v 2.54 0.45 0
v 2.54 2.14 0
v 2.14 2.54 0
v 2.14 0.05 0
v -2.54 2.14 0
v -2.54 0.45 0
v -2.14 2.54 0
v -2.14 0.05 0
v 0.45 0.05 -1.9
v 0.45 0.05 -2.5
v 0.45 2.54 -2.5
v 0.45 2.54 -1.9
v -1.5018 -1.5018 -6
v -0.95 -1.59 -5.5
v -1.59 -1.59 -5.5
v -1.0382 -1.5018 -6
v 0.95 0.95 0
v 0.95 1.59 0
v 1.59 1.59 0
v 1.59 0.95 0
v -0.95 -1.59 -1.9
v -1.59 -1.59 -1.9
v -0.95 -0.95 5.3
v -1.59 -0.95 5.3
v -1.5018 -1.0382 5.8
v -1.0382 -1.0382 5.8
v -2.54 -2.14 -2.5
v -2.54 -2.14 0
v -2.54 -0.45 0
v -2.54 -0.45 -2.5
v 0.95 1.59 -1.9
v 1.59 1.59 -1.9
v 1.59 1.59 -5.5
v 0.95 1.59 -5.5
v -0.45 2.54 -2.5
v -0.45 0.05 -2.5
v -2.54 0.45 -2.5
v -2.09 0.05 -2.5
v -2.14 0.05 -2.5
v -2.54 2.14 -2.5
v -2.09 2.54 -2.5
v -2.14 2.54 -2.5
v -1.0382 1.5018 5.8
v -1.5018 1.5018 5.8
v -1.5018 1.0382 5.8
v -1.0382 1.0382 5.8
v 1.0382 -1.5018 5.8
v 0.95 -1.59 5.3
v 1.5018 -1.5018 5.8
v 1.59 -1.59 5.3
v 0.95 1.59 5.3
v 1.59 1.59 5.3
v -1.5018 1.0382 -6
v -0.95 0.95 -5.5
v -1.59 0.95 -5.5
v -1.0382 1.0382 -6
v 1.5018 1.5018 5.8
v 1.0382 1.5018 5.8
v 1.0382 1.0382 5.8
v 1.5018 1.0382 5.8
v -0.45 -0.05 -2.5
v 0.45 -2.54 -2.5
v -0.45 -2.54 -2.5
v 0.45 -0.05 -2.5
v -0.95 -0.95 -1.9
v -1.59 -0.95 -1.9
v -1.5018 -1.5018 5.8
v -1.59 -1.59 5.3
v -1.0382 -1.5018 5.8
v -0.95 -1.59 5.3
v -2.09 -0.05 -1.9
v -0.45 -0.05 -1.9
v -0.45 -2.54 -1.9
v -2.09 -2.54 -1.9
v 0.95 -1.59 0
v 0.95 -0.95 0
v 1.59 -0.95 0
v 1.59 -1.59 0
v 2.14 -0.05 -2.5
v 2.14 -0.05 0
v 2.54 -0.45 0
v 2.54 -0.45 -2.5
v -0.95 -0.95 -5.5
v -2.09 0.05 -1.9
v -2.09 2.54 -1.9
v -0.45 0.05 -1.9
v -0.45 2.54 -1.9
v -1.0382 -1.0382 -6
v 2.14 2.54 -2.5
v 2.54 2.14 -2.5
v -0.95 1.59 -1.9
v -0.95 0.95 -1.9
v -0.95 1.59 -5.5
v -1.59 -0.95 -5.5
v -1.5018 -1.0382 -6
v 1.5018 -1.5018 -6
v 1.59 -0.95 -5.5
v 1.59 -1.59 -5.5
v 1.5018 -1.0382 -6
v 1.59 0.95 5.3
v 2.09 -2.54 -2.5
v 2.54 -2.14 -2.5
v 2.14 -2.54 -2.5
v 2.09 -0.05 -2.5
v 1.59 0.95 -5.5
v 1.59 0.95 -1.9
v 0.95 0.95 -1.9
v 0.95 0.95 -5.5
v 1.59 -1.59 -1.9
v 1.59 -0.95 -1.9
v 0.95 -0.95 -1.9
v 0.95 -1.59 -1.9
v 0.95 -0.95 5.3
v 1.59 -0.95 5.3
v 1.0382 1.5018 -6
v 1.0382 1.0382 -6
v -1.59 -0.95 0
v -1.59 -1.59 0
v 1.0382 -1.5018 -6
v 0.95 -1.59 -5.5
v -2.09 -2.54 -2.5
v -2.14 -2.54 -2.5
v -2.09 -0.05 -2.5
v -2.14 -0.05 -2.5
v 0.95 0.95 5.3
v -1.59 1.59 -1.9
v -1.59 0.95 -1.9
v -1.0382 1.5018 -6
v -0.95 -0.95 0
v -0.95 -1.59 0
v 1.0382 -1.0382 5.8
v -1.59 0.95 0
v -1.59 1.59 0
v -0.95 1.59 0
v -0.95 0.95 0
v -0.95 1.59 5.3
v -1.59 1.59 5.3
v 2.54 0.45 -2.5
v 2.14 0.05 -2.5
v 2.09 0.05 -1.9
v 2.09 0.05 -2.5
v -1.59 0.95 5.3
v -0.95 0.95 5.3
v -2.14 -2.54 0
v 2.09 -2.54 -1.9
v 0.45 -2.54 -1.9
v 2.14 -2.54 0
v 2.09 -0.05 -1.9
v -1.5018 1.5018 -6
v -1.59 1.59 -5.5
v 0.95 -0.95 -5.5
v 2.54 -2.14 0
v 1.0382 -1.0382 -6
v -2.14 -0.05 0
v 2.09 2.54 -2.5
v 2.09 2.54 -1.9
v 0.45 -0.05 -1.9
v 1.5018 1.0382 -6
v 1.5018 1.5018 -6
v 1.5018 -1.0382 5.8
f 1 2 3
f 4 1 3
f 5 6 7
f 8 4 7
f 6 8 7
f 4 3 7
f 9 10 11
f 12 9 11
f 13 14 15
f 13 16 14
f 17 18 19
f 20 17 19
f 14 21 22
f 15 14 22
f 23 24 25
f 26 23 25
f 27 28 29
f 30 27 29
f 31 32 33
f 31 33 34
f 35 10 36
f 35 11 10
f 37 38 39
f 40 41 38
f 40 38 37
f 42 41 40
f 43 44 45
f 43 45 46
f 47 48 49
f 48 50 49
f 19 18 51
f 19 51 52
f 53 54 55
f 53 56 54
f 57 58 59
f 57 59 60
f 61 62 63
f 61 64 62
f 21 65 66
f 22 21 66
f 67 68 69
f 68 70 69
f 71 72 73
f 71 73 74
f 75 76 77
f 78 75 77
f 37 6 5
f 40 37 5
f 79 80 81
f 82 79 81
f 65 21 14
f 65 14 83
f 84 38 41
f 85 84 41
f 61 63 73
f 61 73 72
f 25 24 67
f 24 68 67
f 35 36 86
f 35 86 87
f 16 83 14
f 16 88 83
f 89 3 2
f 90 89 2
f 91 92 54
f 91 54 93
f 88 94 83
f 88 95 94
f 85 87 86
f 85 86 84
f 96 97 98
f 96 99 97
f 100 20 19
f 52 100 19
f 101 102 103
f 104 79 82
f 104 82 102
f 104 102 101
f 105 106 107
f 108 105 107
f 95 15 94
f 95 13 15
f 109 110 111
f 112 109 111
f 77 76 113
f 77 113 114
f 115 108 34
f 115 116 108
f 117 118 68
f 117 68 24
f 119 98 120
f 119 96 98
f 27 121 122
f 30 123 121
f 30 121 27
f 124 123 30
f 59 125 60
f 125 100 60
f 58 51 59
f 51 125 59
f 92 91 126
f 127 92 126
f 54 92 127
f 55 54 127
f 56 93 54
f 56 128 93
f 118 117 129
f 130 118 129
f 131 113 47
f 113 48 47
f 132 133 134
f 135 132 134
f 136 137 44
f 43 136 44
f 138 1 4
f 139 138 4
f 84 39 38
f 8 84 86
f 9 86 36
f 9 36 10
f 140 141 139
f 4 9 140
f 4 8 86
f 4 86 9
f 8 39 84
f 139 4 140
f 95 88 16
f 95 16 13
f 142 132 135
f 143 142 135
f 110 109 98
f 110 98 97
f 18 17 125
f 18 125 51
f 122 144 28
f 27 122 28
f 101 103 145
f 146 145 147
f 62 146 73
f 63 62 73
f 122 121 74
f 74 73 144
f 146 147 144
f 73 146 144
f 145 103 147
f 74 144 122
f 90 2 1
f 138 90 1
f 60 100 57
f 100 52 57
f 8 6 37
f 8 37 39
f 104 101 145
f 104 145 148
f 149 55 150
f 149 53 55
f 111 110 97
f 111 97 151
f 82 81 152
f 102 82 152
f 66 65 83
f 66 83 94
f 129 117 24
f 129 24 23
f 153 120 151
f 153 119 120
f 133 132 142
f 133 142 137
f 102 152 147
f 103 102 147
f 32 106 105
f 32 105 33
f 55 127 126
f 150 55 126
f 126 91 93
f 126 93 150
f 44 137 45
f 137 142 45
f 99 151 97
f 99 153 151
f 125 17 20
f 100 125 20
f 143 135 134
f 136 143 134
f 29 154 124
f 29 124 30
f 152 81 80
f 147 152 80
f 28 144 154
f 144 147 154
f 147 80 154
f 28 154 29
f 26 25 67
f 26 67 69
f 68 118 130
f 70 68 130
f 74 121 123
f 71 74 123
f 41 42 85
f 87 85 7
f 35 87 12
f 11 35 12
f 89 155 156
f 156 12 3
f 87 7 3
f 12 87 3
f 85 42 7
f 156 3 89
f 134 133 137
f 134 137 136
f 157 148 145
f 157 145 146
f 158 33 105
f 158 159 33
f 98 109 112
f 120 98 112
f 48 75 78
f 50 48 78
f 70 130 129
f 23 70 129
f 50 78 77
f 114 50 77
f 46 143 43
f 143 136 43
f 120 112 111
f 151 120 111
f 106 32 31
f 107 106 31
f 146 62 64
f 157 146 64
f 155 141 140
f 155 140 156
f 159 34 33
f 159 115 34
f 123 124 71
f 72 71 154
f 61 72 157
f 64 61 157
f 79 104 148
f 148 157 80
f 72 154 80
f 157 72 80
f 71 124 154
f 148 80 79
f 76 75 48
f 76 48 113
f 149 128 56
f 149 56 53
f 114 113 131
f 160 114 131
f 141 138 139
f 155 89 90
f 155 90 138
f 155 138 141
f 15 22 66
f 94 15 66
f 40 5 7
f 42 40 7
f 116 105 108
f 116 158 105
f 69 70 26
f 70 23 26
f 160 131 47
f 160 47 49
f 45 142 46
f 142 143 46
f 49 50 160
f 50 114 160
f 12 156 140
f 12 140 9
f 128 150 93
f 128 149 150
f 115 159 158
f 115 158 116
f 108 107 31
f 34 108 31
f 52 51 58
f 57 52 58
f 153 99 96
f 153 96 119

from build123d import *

# Parameters (mm, degrees)
SKETCH1_W             = 0.64
SKETCH1_H             = 0.64
BOSS_EXTRUDE1_DEPTH   = 5.3
BOSS_EXTRUDE1_2_DEPTH = 5.3
BOSS_EXTRUDE1_3_DEPTH = 5.3
BOSS_EXTRUDE1_4_DEPTH = 5.3
SKETCH2_W             = 0.64
SKETCH2_H             = 0.64
BOSS_EXTRUDE2_DEPTH   = 0.5
BOSS_EXTRUDE2_TAPER   = 10
BOSS_EXTRUDE3_DEPTH   = 2.5
SKETCH5_W             = 1.64
SKETCH5_H             = 5.08
CUT_EXTRUDE1_DEPTH    = 0.6
SKETCH6_W             = 5.08
SKETCH6_H             = 0.1
CUT_EXTRUDE2_DEPTH    = 3.5
CUT_EXTRUDE3_DEPTH    = 3.5
SKETCH8_W             = 0.64
SKETCH8_H             = 0.64
BOSS_EXTRUDE4_DEPTH   = 3.6
BOSS_EXTRUDE4_2_DEPTH = 3.6
BOSS_EXTRUDE4_3_DEPTH = 3.6
BOSS_EXTRUDE4_4_DEPTH = 3.6
SKETCH9_W             = 0.64
SKETCH9_H             = 0.64
BOSS_EXTRUDE5_DEPTH   = 0.5
BOSS_EXTRUDE5_TAPER   = 10


with BuildPart() as part:
    # Sketch1 → Boss-Extrude1 (new body)
    with BuildSketch(Plane.XY):
        with Locations((-1.27, 1.27)):
            Rectangle(SKETCH1_W, SKETCH1_H)
    extrude(amount=BOSS_EXTRUDE1_DEPTH)



with BuildPart() as body_2:
    # Sketch1 → Boss-Extrude1 2 (new body)
    with BuildSketch(Plane.XY):
        with Locations((-1.27, -1.27)):
            Rectangle(SKETCH1_W, SKETCH1_H)
    extrude(amount=BOSS_EXTRUDE1_2_DEPTH)


with BuildPart() as body_3:
    # Sketch1 → Boss-Extrude1 3 (new body)
    with BuildSketch(Plane.XY):
        with Locations((1.27, 1.27)):
            Rectangle(SKETCH1_W, SKETCH1_H)
    extrude(amount=BOSS_EXTRUDE1_3_DEPTH)


with BuildPart() as body_4:
    # Sketch1 → Boss-Extrude1 4 (new body)
    with BuildSketch(Plane.XY):
        with Locations((1.27, -1.27)):
            Rectangle(SKETCH1_W, SKETCH1_H)
    extrude(amount=BOSS_EXTRUDE1_4_DEPTH)


with BuildPart() as part_1:
    add(part.part)

    add(body_2.part)  # Boss-Extrude2 merges body 2

    add(body_3.part)  # Boss-Extrude2 merges body 3

    add(body_4.part)  # Boss-Extrude2 merges body 4
    # Sketch2 → Boss-Extrude2 (add)
    with BuildSketch(Plane.XY.offset(5.3)):
        with Locations((-1.27, -1.27)):
            Rectangle(SKETCH2_W, SKETCH2_H)
        with Locations((-1.27, 1.27)):
            Rectangle(SKETCH2_W, SKETCH2_H)
        with Locations((1.27, -1.27)):
            Rectangle(SKETCH2_W, SKETCH2_H)
        with Locations((1.27, 1.27)):
            Rectangle(SKETCH2_W, SKETCH2_H)
    extrude(amount=BOSS_EXTRUDE2_DEPTH, taper=BOSS_EXTRUDE2_TAPER)


with BuildPart() as body_2_2:
    # Sketch3 → Boss-Extrude3 (new body)
    with BuildSketch(Plane.XY):
        Polygon((-2.14, 2.54), (2.14, 2.54), (2.54, 2.14), (2.54, -2.14), (2.14, -2.54), (-2.14, -2.54), (-2.54, -2.14), (-2.54, 2.14), align=None)
    extrude(amount=-BOSS_EXTRUDE3_DEPTH)

    # Sketch5 → Cut-Extrude1 (cut)
    with BuildSketch(Plane(origin=(0, 0, -2.5), x_dir=(-1, 0, 0), z_dir=(0, 0, -1))):
        with Locations((-1.27, 0)):
            Rectangle(SKETCH5_W, SKETCH5_H)
        with Locations((1.27, 0)):
            Rectangle(SKETCH5_W, SKETCH5_H)
    extrude(amount=-CUT_EXTRUDE1_DEPTH, mode=Mode.SUBTRACT)

    # Sketch6 → Cut-Extrude2 (cut, through all)
    with BuildSketch(Plane.XY):
        Rectangle(SKETCH6_W, SKETCH6_H)
    extrude(amount=-CUT_EXTRUDE2_DEPTH, mode=Mode.SUBTRACT)

    # Sketch7 → Cut-Extrude3 (cut, through all)
    with BuildSketch(Plane.XY):
        Polygon((2.54, 0.45), (2.14, 0.05), (2.54, 0.05), align=None)
        Polygon((2.54, -0.05), (2.14, -0.05), (2.54, -0.45), align=None)
        Polygon((-2.54, -0.45), (-2.54, -0.05), (-2.14, -0.05), align=None)
        Polygon((-2.54, 0.05), (-2.54, 0.45), (-2.14, 0.05), align=None)
    extrude(amount=-CUT_EXTRUDE3_DEPTH, mode=Mode.SUBTRACT)


with BuildPart() as body_3_2:
    # Sketch8 → Boss-Extrude4 (new body)
    with BuildSketch(Plane(origin=(0, 0, -1.9), x_dir=(-1, 0, 0), z_dir=(0, 0, -1))):
        with Locations((1.27, -1.27)):
            Rectangle(SKETCH8_W, SKETCH8_H)
    extrude(amount=BOSS_EXTRUDE4_DEPTH)



with BuildPart() as body_4_2:
    # Sketch8 → Boss-Extrude4 2 (new body)
    with BuildSketch(Plane(origin=(0, 0, -1.9), x_dir=(-1, 0, 0), z_dir=(0, 0, -1))):
        with Locations((1.27, 1.27)):
            Rectangle(SKETCH8_W, SKETCH8_H)
    extrude(amount=BOSS_EXTRUDE4_2_DEPTH)


with BuildPart() as body_5:
    # Sketch8 → Boss-Extrude4 3 (new body)
    with BuildSketch(Plane(origin=(0, 0, -1.9), x_dir=(-1, 0, 0), z_dir=(0, 0, -1))):
        with Locations((-1.27, 1.27)):
            Rectangle(SKETCH8_W, SKETCH8_H)
    extrude(amount=BOSS_EXTRUDE4_3_DEPTH)


with BuildPart() as body_6:
    # Sketch8 → Boss-Extrude4 4 (new body)
    with BuildSketch(Plane(origin=(0, 0, -1.9), x_dir=(-1, 0, 0), z_dir=(0, 0, -1))):
        with Locations((-1.27, -1.27)):
            Rectangle(SKETCH8_W, SKETCH8_H)
    extrude(amount=BOSS_EXTRUDE4_4_DEPTH)


with BuildPart() as body_3_2_1:
    add(body_3_2.part)

    add(body_4_2.part)  # Boss-Extrude5 merges body 4 2

    add(body_5.part)  # Boss-Extrude5 merges body 5

    add(body_6.part)  # Boss-Extrude5 merges body 6
    # Sketch9 → Boss-Extrude5 (add)
    with BuildSketch(Plane(origin=(0, 0, -5.5), x_dir=(-1, 0, 0), z_dir=(0, 0, -1))):
        with Locations((1.27, 1.27)):
            Rectangle(SKETCH9_W, SKETCH9_H)
        with Locations((1.27, -1.27)):
            Rectangle(SKETCH9_W, SKETCH9_H)
        with Locations((-1.27, -1.27)):
            Rectangle(SKETCH9_W, SKETCH9_H)
        with Locations((-1.27, 1.27)):
            Rectangle(SKETCH9_W, SKETCH9_H)
    extrude(amount=BOSS_EXTRUDE5_DEPTH, taper=BOSS_EXTRUDE5_TAPER)


solid = Compound([part_1.part, body_2_2.part, body_3_2_1.part])
